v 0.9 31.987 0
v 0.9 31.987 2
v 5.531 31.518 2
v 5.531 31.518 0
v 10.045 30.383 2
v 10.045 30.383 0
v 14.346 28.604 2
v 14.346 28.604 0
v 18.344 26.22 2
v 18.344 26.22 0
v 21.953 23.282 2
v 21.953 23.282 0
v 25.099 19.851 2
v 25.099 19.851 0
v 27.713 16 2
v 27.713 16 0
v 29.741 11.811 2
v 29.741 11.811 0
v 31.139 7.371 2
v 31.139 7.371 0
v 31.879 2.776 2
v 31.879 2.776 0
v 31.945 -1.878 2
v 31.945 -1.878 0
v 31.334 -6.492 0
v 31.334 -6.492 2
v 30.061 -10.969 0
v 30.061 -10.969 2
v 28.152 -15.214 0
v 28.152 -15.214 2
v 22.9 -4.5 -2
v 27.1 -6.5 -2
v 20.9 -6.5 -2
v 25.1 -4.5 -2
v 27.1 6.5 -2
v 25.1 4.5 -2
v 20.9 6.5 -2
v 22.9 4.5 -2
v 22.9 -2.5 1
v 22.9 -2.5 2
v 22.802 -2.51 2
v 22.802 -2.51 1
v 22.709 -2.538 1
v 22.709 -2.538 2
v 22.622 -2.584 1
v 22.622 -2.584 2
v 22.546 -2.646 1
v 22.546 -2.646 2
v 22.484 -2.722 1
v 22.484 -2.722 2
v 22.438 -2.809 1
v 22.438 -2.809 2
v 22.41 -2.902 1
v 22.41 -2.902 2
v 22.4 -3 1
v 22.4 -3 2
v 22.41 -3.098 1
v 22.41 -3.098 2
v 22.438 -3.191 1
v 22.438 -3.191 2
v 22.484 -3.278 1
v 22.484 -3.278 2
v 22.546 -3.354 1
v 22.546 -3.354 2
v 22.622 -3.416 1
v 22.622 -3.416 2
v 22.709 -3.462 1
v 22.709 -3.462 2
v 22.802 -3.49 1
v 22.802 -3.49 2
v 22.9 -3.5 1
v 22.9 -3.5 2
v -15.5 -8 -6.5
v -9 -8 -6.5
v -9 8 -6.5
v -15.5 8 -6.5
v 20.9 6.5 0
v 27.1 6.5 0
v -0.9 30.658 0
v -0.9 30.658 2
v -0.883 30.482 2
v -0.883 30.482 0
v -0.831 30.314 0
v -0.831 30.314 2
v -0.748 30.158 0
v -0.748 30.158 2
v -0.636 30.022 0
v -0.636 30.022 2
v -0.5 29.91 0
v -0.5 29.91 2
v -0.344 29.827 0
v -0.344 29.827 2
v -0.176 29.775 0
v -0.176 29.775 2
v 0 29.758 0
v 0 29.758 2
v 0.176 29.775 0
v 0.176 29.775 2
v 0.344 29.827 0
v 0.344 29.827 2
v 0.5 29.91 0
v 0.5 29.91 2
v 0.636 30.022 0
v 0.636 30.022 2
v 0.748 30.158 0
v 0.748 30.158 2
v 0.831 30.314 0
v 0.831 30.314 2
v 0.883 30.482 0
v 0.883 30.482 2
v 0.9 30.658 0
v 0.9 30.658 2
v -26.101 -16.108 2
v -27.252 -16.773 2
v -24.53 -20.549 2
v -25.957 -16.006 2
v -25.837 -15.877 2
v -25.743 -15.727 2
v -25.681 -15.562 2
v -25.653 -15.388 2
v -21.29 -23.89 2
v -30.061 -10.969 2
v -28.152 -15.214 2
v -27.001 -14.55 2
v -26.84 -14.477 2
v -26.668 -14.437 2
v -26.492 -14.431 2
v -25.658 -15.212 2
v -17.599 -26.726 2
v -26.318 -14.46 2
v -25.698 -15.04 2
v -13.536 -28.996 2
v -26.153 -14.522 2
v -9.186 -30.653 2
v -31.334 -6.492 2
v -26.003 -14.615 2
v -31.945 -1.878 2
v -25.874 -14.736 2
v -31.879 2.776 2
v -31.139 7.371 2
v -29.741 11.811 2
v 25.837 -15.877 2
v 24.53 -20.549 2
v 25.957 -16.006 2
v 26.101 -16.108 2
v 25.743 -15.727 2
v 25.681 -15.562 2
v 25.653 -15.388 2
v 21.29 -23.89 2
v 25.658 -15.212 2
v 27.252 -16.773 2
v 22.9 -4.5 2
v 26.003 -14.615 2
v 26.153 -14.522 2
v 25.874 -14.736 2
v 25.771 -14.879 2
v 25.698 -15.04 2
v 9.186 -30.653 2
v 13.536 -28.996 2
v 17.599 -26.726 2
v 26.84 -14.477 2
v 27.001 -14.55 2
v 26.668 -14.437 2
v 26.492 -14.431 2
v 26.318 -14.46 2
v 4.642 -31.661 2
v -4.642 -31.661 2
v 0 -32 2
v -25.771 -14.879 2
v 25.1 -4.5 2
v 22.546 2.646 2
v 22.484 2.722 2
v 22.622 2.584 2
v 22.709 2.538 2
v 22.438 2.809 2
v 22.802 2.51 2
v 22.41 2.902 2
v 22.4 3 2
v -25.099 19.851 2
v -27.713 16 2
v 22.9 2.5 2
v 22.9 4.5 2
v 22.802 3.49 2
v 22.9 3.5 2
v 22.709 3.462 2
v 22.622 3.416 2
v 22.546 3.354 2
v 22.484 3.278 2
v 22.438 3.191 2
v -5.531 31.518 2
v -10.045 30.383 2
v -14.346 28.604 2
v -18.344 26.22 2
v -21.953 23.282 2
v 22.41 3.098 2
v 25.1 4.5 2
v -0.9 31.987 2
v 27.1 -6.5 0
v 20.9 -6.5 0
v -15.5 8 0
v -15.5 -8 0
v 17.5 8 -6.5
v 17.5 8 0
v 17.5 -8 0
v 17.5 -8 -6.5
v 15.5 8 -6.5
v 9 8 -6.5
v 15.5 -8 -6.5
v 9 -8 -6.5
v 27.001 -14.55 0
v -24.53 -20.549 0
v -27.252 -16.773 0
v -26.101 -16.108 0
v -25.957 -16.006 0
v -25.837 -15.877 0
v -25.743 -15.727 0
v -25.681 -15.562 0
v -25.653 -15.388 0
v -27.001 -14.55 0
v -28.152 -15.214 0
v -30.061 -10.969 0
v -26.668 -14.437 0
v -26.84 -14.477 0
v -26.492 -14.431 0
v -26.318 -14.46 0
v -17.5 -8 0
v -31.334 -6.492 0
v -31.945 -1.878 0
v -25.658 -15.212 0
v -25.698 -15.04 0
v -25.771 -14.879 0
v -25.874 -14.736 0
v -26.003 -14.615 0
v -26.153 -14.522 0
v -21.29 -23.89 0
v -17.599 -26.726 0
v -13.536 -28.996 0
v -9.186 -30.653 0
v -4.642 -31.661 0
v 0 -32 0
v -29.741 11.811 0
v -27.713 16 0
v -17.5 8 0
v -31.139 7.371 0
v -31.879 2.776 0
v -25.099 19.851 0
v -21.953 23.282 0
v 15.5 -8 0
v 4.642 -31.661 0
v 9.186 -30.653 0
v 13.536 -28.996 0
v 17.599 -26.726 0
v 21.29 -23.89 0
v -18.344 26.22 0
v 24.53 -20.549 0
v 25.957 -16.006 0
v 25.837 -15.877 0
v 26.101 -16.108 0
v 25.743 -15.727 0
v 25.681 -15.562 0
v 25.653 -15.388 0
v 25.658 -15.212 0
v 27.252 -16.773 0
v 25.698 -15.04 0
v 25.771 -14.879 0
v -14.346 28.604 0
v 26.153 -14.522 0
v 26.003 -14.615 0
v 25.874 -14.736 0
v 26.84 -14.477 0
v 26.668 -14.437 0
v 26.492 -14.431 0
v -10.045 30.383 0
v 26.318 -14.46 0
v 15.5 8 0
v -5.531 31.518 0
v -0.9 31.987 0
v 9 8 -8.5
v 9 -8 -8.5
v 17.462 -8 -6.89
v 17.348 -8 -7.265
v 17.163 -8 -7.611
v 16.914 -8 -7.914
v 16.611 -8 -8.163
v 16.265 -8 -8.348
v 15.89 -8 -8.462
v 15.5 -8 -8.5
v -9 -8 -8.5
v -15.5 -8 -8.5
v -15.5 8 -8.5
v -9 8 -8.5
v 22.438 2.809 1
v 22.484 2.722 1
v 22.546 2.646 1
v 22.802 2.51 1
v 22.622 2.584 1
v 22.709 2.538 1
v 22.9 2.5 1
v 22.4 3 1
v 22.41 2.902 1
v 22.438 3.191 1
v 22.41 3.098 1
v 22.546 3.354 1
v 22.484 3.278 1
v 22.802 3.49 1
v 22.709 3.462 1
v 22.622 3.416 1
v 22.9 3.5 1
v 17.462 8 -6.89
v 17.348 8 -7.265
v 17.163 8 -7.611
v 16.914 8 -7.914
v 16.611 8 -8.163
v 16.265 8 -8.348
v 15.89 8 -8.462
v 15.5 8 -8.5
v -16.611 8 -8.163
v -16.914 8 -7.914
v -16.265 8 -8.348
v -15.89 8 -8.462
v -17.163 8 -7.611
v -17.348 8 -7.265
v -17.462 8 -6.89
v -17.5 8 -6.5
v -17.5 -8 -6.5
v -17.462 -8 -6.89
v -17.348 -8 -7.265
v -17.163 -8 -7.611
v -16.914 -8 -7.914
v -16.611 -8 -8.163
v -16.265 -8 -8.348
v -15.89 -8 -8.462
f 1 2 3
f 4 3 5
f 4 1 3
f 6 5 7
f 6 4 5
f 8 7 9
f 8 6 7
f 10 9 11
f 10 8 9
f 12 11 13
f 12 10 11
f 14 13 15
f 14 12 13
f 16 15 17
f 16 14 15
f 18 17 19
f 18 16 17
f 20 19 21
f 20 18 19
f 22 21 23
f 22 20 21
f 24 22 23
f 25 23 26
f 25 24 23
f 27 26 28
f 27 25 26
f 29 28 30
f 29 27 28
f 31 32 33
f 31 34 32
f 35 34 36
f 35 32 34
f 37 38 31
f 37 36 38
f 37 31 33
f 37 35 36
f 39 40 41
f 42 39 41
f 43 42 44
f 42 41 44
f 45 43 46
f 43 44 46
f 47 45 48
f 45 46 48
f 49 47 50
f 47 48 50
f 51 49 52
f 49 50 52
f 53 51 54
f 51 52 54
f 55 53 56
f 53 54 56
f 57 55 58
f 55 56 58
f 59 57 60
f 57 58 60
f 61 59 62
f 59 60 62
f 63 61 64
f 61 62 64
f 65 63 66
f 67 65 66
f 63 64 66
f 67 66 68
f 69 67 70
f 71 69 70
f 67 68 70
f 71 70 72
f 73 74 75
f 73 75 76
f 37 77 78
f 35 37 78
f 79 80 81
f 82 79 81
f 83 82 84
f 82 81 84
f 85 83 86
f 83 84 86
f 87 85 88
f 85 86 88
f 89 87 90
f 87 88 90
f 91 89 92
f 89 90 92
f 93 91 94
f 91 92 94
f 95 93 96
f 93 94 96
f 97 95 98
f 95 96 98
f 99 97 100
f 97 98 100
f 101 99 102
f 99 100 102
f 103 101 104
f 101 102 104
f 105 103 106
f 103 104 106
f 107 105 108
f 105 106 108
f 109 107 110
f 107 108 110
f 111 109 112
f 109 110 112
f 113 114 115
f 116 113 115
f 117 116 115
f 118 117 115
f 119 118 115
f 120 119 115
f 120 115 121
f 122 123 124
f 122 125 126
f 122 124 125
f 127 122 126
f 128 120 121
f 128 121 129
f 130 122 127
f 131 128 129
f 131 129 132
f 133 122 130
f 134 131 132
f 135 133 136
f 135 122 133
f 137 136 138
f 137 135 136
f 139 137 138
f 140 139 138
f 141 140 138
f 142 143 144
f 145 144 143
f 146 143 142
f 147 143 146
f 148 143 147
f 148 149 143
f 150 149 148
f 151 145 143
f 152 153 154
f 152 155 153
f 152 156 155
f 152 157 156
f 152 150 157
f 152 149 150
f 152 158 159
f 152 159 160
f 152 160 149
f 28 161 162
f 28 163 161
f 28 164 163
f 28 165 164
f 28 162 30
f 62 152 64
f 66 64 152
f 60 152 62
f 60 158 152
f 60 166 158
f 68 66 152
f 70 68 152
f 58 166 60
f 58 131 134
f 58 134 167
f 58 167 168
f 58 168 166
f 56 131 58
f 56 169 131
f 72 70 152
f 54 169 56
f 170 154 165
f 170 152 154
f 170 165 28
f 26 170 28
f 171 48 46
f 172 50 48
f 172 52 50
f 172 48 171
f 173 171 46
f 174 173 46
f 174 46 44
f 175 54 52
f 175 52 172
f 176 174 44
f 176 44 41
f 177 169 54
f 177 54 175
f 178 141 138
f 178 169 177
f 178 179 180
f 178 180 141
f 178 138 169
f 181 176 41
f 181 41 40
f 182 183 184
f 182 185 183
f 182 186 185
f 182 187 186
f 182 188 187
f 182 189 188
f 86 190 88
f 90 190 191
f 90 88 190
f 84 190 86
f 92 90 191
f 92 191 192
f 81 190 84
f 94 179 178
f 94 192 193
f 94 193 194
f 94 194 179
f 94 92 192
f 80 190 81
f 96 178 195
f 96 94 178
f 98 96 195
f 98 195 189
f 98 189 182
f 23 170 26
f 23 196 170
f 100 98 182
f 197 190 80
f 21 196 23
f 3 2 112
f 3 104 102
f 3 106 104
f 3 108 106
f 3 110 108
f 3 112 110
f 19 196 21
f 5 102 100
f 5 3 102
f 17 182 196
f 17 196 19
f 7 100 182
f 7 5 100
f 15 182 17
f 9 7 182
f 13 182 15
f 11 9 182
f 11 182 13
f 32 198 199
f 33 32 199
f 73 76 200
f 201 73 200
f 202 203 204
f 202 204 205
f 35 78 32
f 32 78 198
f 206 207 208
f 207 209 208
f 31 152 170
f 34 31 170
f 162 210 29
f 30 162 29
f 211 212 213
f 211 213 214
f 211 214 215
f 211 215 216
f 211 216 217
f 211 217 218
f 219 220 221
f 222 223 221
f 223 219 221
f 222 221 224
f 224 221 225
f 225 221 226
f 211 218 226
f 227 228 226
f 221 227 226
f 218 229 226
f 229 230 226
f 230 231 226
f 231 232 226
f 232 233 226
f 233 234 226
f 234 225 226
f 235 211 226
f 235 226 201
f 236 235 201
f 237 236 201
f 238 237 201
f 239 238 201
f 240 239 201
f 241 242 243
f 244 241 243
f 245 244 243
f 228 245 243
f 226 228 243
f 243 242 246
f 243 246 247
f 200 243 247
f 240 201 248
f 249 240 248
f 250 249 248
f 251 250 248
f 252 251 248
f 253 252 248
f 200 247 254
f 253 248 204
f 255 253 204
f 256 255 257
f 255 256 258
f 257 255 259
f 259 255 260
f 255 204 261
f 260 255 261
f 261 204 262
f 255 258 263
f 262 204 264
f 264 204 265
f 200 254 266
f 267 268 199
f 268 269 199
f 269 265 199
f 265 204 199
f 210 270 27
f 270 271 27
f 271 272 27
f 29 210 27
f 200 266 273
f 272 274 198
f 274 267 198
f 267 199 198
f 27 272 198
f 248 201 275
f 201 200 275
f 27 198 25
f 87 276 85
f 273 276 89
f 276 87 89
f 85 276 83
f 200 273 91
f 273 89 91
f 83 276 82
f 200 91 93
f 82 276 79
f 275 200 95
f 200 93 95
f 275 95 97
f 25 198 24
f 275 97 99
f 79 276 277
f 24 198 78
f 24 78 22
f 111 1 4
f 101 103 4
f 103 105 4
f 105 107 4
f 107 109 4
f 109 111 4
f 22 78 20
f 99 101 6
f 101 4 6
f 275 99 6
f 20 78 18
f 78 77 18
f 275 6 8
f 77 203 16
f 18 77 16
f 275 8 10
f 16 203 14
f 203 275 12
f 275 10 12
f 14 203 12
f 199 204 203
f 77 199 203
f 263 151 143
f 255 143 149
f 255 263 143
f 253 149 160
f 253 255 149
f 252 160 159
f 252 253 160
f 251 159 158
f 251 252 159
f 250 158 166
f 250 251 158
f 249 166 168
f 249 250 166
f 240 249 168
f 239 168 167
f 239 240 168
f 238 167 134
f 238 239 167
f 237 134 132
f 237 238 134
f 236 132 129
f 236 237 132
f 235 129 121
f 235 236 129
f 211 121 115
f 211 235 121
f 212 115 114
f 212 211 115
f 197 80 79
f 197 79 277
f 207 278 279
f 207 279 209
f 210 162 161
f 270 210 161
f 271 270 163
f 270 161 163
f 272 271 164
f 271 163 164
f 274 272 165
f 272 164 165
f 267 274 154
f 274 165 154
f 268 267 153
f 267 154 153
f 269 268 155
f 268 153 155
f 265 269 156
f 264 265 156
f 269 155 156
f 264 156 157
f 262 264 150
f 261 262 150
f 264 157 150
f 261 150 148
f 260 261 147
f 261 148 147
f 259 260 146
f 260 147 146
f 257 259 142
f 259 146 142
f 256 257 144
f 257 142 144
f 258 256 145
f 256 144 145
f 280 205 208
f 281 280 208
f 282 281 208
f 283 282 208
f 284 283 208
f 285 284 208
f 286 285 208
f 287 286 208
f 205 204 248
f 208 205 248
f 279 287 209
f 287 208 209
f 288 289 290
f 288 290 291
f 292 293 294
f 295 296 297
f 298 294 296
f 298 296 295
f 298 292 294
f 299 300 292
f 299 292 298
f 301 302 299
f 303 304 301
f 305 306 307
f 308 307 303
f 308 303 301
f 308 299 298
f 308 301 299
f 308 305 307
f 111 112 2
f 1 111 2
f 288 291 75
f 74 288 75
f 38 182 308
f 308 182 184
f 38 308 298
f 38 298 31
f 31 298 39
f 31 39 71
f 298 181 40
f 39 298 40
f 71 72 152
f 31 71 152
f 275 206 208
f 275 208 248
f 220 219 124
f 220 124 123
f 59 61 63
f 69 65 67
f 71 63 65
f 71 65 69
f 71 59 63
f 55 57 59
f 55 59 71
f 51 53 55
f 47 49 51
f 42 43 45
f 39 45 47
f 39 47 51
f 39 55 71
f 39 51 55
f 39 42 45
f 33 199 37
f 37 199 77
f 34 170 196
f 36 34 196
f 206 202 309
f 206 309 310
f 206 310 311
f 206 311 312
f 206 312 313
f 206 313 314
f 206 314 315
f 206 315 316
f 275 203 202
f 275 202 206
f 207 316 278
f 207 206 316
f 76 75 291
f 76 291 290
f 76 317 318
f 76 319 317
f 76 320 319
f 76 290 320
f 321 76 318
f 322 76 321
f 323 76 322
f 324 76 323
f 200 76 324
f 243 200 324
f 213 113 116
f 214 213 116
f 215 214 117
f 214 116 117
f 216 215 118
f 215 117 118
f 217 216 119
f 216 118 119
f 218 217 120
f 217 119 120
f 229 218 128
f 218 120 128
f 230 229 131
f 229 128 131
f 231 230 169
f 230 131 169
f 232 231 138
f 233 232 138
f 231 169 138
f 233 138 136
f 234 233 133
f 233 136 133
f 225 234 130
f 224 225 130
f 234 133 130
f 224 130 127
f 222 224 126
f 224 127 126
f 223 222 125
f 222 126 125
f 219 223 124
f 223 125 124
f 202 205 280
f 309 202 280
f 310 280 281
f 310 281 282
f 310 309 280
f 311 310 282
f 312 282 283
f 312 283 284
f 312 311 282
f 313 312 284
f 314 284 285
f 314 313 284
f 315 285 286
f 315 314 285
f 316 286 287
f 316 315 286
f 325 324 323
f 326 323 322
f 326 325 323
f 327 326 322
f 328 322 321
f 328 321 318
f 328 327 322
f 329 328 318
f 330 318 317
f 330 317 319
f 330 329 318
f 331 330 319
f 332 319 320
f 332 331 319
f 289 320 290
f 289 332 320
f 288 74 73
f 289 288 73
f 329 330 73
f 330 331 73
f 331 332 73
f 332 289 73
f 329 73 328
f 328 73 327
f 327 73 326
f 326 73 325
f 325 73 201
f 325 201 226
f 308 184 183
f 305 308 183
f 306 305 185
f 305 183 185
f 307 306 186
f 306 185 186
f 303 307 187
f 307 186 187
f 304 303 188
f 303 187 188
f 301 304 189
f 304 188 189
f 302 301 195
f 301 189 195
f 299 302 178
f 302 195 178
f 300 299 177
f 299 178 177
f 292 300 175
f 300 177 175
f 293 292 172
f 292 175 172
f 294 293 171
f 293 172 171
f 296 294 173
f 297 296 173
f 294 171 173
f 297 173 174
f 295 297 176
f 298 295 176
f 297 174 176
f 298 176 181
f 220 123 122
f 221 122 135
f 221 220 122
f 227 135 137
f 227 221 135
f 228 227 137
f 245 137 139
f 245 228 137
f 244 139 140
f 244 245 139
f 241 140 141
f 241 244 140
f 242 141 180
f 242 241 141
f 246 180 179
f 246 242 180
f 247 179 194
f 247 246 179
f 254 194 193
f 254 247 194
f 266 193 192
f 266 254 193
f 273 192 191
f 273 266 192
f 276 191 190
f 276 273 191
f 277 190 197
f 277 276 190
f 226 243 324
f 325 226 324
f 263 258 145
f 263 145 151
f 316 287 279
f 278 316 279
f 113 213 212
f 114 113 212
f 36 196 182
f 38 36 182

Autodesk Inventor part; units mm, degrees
ref_plane "YZ Plane" through (0, 0, 0) normal (1, 0, 0) x (0, 1, 0)
ref_plane "XZ Plane" through (0, 0, 0) normal (0, 1, 0) x (-1, 0, 0)
ref_plane "XY Plane" through (0, 0, 0) normal (0, 0, 1) x (1, 0, 0)
sketch "Sketch1" plane through (0, 0, 0) normal (0, 0, 1) x (1, 0, 0)
  circle A0 centre (0, 0) radius 32
  dimension "d0" = 64
extrude "Extrusion1" add sketch "Sketch1" along normal blind 2
sketch "Sketch2" plane through (0, 0, 2) normal (0, 0, 1) x (1, 0, 0)
  line L0 (0, 0) -> (0, 32) construction
  circle A0 centre (0, 0) radius 32 construction
  arc A1 (-0.9, 30.658) -> (0.9, 30.658) centre (0, 30.658) ccw
  line L1 (-0.9, 30.658) -> (-0.9, 31.9873)
  line L2 (0.9, 30.658) -> (0.9, 31.9873)
  circle A2 centre (0, 0) radius 32 projected
  arc A3 (0.9, 31.9873) -> (-0.9, 31.9873) centre (0, 0) ccw
  arc A4 (-26.1006, -16.1084) -> (-27.0006, -14.5496) centre (-26.5506, -15.329) ccw
  line L3 (-26.1006, -16.1084) -> (-27.2519, -16.7731)
  line L4 (-27.0006, -14.5496) -> (-28.1519, -15.2142)
  arc A5 (-28.1519, -15.2142) -> (-27.2519, -16.7731) centre (0, 0) ccw
  arc A6 (27.0006, -14.5496) -> (26.1006, -16.1084) centre (26.5506, -15.329) ccw
  line L5 (27.0006, -14.5496) -> (28.1519, -15.2142)
  line L6 (26.1006, -16.1084) -> (27.2519, -16.7731)
  arc A7 (27.2519, -16.7731) -> (28.1519, -15.2142) centre (0, 0) ccw
  point P0 (-27.7128, -16)
  point P1 (27.7128, -16)
  dimension "d3" = 30.658
  dimension "d4" = 1.8
  dimension "d7" = 360
extrude "Extrusion2" cut sketch "Sketch2" against normal through all contours L1 A2 L2 A1 | L4 A4 L3 A2 | A2 L6 A6 L5
sketch "Sketch3" plane through (0, 0, 2) normal (0, 0, 1) x (1, 0, 0)
  line L0 (22.9, -4.5) -> (25.1, -4.5)
  line L1 (25.1, -4.5) -> (25.1, 4.5)
  line L2 (25.1, 4.5) -> (22.9, 4.5)
  line L3 (22.9, 4.5) -> (22.9, -4.5)
  line L4 (22.9, -4.5) -> (25.1, 4.5) construction
  line L5 (25.1, -4.5) -> (22.9, 4.5) construction
  circle A0 centre (0, 0) radius 28.815 construction
  point P0 (24, 0)
  dimension "d11" = 2.2
  dimension "d12" = 9
  dimension "d21" = 57.63
  dimension "d22" = 24
extrude "Extrusion3" cut sketch "Sketch3" against normal through all
sketch "Sketch4" plane through (0, 0, 2) normal (0, 0, 1) x (1, 0, 0)
  line L0 (25.1, 4.5) -> (25.1, -4.5) projected
  line L1 (25.1, -4.5) -> (22.9, -4.5) projected
  line L2 (22.9, -4.5) -> (22.9, 4.5) projected
  line L3 (22.9, 4.5) -> (25.1, 4.5) projected
  line L4 (-26.1006, -16.1084) -> (-27.2519, -16.7731) projected
  arc A0 (-27.2519, -16.7731) -> (27.2519, -16.7731) centre (0, 0) ccw projected
  line L5 (27.2519, -16.7731) -> (26.1006, -16.1084) projected
  arc A1 (27.0006, -14.5496) -> (26.1006, -16.1084) centre (26.5506, -15.329) ccw projected
  line L6 (27.0006, -14.5496) -> (28.1519, -15.2142) projected
  arc A2 (28.1519, -15.2142) -> (0.9, 31.9873) centre (0, 0) ccw projected
  line L7 (0.9, 31.9873) -> (0.9, 30.658) projected
  arc A3 (-0.9, 30.658) -> (0.9, 30.658) centre (0, 30.658) ccw projected
  line L8 (-0.9, 30.658) -> (-0.9, 31.9873) projected
  arc A4 (-0.9, 31.9873) -> (-28.1519, -15.2142) centre (0, 0) ccw projected
  line L9 (-28.1519, -15.2142) -> (-27.0006, -14.5496) projected
  arc A5 (-26.1006, -16.1084) -> (-27.0006, -14.5496) centre (-26.5506, -15.329) ccw projected
  line L10 (22.9, -4.5) -> (22.9, 4.5) projected
  line L11 (22.9, 0) -> (25.1, 0) construction
  arc A6 (22.9, 3.5) -> (22.9, 2.5) centre (22.9, 3) ccw
  arc A7 (22.9, -2.5) -> (22.9, -3.5) centre (22.9, -3) ccw
  line L12 (22.9, -2.5) -> (22.9, -3.5)
  line L13 (22.9, 3.5) -> (22.9, 2.5)
  dimension "d15" = 3
  dimension "d16" = 3
  dimension "d17" = 1
  dimension "d18" = 1
extrude "Extrusion4" cut sketch "Sketch4" against normal blind 1 contours L2 A6 | A7 L2
sketch "Sketch5" plane through (0, 0, 0) normal (0, 0, -1) x (-1, 0, 0)
  line L0 (-25.1, -4.5) -> (-25.1, 4.5) projected
  line L1 (-25.1, 4.5) -> (-22.9, 4.5) projected
  line L2 (-22.9, 4.5) -> (-22.9, -4.5) projected
  line L3 (-22.9, -4.5) -> (-25.1, -4.5) projected
  line L4 (27.2519, -16.7731) -> (26.1006, -16.1084) projected
  arc A0 (27.0006, -14.5496) -> (26.1006, -16.1084) centre (26.5506, -15.329) ccw projected
  line L5 (27.0006, -14.5496) -> (28.1519, -15.2142) projected
  arc A1 (28.1519, -15.2142) -> (0.9, 31.9873) centre (0, 0) ccw projected
  line L6 (0.9, 31.9873) -> (0.9, 30.658) projected
  arc A2 (-0.9, 30.658) -> (0.9, 30.658) centre (0, 30.658) ccw projected
  line L7 (-0.9, 30.658) -> (-0.9, 31.9873) projected
  arc A3 (-0.9, 31.9873) -> (-28.1519, -15.2142) centre (0, 0) ccw projected
  line L8 (-28.1519, -15.2142) -> (-27.0006, -14.5496) projected
  arc A4 (-26.1006, -16.1084) -> (-27.0006, -14.5496) centre (-26.5506, -15.329) ccw projected
  line L9 (-26.1006, -16.1084) -> (-27.2519, -16.7731) projected
  arc A5 (-27.2519, -16.7731) -> (27.2519, -16.7731) centre (0, 0) ccw projected
  line L10 (-22.9, 4.5) -> (-25.1, 4.5)
  line L11 (-25.1, 4.5) -> (-25.1, -4.5)
  line L12 (-25.1, -4.5) -> (-22.9, -4.5)
  line L13 (-22.9, -4.5) -> (-22.9, 4.5)
  line L14 (-22.9, 4.5) -> (-25.1, -4.5) construction
  line L15 (-25.1, 4.5) -> (-22.9, -4.5) construction
  line L16 (-20.9, 6.5) -> (-27.1, 6.5)
  line L17 (-27.1, 6.5) -> (-27.1, -6.5)
  line L18 (-27.1, -6.5) -> (-20.9, -6.5)
  line L19 (-20.9, -6.5) -> (-20.9, 6.5)
  circle A6 centre (0, 0) radius 28.815 construction
  point P0 (-24, 0)
  dimension "d23" = 2
  dimension "d24" = 57.63
extrude "Extrusion5" add sketch "Sketch5" along normal blind 2 contours L19 L18 L17 L16
sketch "Sketch6" plane through (0, 0, 0) normal (0, 1, 0) x (-1, 0, 0)
  line L0 (0, 0) -> (-15.5, 0) construction
  line L1 (-27.2519, 0) -> (27.2519, 0) projected
  line L2 (-15.5, 0) -> (-17.5, 0)
  line L3 (-17.5, 0) -> (-17.5, -8.5)
  line L4 (-17.5, -8.5) -> (-9, -8.5)
  line L5 (-9, -8.5) -> (-9, -6.5)
  line L6 (-9, -6.5) -> (-15.5, -6.5)
  line L7 (-15.5, -6.5) -> (-15.5, 0)
  line L8 (0, 0) -> (0, -14.0631) construction
  line L9 (15.5, 0) -> (17.5, 0)
  line L10 (17.5, 0) -> (17.5, -8.5)
  line L11 (17.5, -8.5) -> (9, -8.5)
  line L12 (9, -8.5) -> (9, -6.5)
  line L13 (9, -6.5) -> (15.5, -6.5)
  line L14 (15.5, -6.5) -> (15.5, 0)
  dimension "d27" = 15.5
  dimension "d28" = 2
  dimension "d29" = 8.5
  dimension "d30" = 8.5
  dimension "d31" = 2
extrude "Extrusion6" add sketch "Sketch6" along normal mid plane 16
fillet "Fillet1" radius 2 1 edges at (-17.5, 0, -8.5)
fillet "Fillet2" radius 2 1 edges at (17.5, 0, -8.5)
properties part number "joint_lid" material "Acetal Resin, Black"
